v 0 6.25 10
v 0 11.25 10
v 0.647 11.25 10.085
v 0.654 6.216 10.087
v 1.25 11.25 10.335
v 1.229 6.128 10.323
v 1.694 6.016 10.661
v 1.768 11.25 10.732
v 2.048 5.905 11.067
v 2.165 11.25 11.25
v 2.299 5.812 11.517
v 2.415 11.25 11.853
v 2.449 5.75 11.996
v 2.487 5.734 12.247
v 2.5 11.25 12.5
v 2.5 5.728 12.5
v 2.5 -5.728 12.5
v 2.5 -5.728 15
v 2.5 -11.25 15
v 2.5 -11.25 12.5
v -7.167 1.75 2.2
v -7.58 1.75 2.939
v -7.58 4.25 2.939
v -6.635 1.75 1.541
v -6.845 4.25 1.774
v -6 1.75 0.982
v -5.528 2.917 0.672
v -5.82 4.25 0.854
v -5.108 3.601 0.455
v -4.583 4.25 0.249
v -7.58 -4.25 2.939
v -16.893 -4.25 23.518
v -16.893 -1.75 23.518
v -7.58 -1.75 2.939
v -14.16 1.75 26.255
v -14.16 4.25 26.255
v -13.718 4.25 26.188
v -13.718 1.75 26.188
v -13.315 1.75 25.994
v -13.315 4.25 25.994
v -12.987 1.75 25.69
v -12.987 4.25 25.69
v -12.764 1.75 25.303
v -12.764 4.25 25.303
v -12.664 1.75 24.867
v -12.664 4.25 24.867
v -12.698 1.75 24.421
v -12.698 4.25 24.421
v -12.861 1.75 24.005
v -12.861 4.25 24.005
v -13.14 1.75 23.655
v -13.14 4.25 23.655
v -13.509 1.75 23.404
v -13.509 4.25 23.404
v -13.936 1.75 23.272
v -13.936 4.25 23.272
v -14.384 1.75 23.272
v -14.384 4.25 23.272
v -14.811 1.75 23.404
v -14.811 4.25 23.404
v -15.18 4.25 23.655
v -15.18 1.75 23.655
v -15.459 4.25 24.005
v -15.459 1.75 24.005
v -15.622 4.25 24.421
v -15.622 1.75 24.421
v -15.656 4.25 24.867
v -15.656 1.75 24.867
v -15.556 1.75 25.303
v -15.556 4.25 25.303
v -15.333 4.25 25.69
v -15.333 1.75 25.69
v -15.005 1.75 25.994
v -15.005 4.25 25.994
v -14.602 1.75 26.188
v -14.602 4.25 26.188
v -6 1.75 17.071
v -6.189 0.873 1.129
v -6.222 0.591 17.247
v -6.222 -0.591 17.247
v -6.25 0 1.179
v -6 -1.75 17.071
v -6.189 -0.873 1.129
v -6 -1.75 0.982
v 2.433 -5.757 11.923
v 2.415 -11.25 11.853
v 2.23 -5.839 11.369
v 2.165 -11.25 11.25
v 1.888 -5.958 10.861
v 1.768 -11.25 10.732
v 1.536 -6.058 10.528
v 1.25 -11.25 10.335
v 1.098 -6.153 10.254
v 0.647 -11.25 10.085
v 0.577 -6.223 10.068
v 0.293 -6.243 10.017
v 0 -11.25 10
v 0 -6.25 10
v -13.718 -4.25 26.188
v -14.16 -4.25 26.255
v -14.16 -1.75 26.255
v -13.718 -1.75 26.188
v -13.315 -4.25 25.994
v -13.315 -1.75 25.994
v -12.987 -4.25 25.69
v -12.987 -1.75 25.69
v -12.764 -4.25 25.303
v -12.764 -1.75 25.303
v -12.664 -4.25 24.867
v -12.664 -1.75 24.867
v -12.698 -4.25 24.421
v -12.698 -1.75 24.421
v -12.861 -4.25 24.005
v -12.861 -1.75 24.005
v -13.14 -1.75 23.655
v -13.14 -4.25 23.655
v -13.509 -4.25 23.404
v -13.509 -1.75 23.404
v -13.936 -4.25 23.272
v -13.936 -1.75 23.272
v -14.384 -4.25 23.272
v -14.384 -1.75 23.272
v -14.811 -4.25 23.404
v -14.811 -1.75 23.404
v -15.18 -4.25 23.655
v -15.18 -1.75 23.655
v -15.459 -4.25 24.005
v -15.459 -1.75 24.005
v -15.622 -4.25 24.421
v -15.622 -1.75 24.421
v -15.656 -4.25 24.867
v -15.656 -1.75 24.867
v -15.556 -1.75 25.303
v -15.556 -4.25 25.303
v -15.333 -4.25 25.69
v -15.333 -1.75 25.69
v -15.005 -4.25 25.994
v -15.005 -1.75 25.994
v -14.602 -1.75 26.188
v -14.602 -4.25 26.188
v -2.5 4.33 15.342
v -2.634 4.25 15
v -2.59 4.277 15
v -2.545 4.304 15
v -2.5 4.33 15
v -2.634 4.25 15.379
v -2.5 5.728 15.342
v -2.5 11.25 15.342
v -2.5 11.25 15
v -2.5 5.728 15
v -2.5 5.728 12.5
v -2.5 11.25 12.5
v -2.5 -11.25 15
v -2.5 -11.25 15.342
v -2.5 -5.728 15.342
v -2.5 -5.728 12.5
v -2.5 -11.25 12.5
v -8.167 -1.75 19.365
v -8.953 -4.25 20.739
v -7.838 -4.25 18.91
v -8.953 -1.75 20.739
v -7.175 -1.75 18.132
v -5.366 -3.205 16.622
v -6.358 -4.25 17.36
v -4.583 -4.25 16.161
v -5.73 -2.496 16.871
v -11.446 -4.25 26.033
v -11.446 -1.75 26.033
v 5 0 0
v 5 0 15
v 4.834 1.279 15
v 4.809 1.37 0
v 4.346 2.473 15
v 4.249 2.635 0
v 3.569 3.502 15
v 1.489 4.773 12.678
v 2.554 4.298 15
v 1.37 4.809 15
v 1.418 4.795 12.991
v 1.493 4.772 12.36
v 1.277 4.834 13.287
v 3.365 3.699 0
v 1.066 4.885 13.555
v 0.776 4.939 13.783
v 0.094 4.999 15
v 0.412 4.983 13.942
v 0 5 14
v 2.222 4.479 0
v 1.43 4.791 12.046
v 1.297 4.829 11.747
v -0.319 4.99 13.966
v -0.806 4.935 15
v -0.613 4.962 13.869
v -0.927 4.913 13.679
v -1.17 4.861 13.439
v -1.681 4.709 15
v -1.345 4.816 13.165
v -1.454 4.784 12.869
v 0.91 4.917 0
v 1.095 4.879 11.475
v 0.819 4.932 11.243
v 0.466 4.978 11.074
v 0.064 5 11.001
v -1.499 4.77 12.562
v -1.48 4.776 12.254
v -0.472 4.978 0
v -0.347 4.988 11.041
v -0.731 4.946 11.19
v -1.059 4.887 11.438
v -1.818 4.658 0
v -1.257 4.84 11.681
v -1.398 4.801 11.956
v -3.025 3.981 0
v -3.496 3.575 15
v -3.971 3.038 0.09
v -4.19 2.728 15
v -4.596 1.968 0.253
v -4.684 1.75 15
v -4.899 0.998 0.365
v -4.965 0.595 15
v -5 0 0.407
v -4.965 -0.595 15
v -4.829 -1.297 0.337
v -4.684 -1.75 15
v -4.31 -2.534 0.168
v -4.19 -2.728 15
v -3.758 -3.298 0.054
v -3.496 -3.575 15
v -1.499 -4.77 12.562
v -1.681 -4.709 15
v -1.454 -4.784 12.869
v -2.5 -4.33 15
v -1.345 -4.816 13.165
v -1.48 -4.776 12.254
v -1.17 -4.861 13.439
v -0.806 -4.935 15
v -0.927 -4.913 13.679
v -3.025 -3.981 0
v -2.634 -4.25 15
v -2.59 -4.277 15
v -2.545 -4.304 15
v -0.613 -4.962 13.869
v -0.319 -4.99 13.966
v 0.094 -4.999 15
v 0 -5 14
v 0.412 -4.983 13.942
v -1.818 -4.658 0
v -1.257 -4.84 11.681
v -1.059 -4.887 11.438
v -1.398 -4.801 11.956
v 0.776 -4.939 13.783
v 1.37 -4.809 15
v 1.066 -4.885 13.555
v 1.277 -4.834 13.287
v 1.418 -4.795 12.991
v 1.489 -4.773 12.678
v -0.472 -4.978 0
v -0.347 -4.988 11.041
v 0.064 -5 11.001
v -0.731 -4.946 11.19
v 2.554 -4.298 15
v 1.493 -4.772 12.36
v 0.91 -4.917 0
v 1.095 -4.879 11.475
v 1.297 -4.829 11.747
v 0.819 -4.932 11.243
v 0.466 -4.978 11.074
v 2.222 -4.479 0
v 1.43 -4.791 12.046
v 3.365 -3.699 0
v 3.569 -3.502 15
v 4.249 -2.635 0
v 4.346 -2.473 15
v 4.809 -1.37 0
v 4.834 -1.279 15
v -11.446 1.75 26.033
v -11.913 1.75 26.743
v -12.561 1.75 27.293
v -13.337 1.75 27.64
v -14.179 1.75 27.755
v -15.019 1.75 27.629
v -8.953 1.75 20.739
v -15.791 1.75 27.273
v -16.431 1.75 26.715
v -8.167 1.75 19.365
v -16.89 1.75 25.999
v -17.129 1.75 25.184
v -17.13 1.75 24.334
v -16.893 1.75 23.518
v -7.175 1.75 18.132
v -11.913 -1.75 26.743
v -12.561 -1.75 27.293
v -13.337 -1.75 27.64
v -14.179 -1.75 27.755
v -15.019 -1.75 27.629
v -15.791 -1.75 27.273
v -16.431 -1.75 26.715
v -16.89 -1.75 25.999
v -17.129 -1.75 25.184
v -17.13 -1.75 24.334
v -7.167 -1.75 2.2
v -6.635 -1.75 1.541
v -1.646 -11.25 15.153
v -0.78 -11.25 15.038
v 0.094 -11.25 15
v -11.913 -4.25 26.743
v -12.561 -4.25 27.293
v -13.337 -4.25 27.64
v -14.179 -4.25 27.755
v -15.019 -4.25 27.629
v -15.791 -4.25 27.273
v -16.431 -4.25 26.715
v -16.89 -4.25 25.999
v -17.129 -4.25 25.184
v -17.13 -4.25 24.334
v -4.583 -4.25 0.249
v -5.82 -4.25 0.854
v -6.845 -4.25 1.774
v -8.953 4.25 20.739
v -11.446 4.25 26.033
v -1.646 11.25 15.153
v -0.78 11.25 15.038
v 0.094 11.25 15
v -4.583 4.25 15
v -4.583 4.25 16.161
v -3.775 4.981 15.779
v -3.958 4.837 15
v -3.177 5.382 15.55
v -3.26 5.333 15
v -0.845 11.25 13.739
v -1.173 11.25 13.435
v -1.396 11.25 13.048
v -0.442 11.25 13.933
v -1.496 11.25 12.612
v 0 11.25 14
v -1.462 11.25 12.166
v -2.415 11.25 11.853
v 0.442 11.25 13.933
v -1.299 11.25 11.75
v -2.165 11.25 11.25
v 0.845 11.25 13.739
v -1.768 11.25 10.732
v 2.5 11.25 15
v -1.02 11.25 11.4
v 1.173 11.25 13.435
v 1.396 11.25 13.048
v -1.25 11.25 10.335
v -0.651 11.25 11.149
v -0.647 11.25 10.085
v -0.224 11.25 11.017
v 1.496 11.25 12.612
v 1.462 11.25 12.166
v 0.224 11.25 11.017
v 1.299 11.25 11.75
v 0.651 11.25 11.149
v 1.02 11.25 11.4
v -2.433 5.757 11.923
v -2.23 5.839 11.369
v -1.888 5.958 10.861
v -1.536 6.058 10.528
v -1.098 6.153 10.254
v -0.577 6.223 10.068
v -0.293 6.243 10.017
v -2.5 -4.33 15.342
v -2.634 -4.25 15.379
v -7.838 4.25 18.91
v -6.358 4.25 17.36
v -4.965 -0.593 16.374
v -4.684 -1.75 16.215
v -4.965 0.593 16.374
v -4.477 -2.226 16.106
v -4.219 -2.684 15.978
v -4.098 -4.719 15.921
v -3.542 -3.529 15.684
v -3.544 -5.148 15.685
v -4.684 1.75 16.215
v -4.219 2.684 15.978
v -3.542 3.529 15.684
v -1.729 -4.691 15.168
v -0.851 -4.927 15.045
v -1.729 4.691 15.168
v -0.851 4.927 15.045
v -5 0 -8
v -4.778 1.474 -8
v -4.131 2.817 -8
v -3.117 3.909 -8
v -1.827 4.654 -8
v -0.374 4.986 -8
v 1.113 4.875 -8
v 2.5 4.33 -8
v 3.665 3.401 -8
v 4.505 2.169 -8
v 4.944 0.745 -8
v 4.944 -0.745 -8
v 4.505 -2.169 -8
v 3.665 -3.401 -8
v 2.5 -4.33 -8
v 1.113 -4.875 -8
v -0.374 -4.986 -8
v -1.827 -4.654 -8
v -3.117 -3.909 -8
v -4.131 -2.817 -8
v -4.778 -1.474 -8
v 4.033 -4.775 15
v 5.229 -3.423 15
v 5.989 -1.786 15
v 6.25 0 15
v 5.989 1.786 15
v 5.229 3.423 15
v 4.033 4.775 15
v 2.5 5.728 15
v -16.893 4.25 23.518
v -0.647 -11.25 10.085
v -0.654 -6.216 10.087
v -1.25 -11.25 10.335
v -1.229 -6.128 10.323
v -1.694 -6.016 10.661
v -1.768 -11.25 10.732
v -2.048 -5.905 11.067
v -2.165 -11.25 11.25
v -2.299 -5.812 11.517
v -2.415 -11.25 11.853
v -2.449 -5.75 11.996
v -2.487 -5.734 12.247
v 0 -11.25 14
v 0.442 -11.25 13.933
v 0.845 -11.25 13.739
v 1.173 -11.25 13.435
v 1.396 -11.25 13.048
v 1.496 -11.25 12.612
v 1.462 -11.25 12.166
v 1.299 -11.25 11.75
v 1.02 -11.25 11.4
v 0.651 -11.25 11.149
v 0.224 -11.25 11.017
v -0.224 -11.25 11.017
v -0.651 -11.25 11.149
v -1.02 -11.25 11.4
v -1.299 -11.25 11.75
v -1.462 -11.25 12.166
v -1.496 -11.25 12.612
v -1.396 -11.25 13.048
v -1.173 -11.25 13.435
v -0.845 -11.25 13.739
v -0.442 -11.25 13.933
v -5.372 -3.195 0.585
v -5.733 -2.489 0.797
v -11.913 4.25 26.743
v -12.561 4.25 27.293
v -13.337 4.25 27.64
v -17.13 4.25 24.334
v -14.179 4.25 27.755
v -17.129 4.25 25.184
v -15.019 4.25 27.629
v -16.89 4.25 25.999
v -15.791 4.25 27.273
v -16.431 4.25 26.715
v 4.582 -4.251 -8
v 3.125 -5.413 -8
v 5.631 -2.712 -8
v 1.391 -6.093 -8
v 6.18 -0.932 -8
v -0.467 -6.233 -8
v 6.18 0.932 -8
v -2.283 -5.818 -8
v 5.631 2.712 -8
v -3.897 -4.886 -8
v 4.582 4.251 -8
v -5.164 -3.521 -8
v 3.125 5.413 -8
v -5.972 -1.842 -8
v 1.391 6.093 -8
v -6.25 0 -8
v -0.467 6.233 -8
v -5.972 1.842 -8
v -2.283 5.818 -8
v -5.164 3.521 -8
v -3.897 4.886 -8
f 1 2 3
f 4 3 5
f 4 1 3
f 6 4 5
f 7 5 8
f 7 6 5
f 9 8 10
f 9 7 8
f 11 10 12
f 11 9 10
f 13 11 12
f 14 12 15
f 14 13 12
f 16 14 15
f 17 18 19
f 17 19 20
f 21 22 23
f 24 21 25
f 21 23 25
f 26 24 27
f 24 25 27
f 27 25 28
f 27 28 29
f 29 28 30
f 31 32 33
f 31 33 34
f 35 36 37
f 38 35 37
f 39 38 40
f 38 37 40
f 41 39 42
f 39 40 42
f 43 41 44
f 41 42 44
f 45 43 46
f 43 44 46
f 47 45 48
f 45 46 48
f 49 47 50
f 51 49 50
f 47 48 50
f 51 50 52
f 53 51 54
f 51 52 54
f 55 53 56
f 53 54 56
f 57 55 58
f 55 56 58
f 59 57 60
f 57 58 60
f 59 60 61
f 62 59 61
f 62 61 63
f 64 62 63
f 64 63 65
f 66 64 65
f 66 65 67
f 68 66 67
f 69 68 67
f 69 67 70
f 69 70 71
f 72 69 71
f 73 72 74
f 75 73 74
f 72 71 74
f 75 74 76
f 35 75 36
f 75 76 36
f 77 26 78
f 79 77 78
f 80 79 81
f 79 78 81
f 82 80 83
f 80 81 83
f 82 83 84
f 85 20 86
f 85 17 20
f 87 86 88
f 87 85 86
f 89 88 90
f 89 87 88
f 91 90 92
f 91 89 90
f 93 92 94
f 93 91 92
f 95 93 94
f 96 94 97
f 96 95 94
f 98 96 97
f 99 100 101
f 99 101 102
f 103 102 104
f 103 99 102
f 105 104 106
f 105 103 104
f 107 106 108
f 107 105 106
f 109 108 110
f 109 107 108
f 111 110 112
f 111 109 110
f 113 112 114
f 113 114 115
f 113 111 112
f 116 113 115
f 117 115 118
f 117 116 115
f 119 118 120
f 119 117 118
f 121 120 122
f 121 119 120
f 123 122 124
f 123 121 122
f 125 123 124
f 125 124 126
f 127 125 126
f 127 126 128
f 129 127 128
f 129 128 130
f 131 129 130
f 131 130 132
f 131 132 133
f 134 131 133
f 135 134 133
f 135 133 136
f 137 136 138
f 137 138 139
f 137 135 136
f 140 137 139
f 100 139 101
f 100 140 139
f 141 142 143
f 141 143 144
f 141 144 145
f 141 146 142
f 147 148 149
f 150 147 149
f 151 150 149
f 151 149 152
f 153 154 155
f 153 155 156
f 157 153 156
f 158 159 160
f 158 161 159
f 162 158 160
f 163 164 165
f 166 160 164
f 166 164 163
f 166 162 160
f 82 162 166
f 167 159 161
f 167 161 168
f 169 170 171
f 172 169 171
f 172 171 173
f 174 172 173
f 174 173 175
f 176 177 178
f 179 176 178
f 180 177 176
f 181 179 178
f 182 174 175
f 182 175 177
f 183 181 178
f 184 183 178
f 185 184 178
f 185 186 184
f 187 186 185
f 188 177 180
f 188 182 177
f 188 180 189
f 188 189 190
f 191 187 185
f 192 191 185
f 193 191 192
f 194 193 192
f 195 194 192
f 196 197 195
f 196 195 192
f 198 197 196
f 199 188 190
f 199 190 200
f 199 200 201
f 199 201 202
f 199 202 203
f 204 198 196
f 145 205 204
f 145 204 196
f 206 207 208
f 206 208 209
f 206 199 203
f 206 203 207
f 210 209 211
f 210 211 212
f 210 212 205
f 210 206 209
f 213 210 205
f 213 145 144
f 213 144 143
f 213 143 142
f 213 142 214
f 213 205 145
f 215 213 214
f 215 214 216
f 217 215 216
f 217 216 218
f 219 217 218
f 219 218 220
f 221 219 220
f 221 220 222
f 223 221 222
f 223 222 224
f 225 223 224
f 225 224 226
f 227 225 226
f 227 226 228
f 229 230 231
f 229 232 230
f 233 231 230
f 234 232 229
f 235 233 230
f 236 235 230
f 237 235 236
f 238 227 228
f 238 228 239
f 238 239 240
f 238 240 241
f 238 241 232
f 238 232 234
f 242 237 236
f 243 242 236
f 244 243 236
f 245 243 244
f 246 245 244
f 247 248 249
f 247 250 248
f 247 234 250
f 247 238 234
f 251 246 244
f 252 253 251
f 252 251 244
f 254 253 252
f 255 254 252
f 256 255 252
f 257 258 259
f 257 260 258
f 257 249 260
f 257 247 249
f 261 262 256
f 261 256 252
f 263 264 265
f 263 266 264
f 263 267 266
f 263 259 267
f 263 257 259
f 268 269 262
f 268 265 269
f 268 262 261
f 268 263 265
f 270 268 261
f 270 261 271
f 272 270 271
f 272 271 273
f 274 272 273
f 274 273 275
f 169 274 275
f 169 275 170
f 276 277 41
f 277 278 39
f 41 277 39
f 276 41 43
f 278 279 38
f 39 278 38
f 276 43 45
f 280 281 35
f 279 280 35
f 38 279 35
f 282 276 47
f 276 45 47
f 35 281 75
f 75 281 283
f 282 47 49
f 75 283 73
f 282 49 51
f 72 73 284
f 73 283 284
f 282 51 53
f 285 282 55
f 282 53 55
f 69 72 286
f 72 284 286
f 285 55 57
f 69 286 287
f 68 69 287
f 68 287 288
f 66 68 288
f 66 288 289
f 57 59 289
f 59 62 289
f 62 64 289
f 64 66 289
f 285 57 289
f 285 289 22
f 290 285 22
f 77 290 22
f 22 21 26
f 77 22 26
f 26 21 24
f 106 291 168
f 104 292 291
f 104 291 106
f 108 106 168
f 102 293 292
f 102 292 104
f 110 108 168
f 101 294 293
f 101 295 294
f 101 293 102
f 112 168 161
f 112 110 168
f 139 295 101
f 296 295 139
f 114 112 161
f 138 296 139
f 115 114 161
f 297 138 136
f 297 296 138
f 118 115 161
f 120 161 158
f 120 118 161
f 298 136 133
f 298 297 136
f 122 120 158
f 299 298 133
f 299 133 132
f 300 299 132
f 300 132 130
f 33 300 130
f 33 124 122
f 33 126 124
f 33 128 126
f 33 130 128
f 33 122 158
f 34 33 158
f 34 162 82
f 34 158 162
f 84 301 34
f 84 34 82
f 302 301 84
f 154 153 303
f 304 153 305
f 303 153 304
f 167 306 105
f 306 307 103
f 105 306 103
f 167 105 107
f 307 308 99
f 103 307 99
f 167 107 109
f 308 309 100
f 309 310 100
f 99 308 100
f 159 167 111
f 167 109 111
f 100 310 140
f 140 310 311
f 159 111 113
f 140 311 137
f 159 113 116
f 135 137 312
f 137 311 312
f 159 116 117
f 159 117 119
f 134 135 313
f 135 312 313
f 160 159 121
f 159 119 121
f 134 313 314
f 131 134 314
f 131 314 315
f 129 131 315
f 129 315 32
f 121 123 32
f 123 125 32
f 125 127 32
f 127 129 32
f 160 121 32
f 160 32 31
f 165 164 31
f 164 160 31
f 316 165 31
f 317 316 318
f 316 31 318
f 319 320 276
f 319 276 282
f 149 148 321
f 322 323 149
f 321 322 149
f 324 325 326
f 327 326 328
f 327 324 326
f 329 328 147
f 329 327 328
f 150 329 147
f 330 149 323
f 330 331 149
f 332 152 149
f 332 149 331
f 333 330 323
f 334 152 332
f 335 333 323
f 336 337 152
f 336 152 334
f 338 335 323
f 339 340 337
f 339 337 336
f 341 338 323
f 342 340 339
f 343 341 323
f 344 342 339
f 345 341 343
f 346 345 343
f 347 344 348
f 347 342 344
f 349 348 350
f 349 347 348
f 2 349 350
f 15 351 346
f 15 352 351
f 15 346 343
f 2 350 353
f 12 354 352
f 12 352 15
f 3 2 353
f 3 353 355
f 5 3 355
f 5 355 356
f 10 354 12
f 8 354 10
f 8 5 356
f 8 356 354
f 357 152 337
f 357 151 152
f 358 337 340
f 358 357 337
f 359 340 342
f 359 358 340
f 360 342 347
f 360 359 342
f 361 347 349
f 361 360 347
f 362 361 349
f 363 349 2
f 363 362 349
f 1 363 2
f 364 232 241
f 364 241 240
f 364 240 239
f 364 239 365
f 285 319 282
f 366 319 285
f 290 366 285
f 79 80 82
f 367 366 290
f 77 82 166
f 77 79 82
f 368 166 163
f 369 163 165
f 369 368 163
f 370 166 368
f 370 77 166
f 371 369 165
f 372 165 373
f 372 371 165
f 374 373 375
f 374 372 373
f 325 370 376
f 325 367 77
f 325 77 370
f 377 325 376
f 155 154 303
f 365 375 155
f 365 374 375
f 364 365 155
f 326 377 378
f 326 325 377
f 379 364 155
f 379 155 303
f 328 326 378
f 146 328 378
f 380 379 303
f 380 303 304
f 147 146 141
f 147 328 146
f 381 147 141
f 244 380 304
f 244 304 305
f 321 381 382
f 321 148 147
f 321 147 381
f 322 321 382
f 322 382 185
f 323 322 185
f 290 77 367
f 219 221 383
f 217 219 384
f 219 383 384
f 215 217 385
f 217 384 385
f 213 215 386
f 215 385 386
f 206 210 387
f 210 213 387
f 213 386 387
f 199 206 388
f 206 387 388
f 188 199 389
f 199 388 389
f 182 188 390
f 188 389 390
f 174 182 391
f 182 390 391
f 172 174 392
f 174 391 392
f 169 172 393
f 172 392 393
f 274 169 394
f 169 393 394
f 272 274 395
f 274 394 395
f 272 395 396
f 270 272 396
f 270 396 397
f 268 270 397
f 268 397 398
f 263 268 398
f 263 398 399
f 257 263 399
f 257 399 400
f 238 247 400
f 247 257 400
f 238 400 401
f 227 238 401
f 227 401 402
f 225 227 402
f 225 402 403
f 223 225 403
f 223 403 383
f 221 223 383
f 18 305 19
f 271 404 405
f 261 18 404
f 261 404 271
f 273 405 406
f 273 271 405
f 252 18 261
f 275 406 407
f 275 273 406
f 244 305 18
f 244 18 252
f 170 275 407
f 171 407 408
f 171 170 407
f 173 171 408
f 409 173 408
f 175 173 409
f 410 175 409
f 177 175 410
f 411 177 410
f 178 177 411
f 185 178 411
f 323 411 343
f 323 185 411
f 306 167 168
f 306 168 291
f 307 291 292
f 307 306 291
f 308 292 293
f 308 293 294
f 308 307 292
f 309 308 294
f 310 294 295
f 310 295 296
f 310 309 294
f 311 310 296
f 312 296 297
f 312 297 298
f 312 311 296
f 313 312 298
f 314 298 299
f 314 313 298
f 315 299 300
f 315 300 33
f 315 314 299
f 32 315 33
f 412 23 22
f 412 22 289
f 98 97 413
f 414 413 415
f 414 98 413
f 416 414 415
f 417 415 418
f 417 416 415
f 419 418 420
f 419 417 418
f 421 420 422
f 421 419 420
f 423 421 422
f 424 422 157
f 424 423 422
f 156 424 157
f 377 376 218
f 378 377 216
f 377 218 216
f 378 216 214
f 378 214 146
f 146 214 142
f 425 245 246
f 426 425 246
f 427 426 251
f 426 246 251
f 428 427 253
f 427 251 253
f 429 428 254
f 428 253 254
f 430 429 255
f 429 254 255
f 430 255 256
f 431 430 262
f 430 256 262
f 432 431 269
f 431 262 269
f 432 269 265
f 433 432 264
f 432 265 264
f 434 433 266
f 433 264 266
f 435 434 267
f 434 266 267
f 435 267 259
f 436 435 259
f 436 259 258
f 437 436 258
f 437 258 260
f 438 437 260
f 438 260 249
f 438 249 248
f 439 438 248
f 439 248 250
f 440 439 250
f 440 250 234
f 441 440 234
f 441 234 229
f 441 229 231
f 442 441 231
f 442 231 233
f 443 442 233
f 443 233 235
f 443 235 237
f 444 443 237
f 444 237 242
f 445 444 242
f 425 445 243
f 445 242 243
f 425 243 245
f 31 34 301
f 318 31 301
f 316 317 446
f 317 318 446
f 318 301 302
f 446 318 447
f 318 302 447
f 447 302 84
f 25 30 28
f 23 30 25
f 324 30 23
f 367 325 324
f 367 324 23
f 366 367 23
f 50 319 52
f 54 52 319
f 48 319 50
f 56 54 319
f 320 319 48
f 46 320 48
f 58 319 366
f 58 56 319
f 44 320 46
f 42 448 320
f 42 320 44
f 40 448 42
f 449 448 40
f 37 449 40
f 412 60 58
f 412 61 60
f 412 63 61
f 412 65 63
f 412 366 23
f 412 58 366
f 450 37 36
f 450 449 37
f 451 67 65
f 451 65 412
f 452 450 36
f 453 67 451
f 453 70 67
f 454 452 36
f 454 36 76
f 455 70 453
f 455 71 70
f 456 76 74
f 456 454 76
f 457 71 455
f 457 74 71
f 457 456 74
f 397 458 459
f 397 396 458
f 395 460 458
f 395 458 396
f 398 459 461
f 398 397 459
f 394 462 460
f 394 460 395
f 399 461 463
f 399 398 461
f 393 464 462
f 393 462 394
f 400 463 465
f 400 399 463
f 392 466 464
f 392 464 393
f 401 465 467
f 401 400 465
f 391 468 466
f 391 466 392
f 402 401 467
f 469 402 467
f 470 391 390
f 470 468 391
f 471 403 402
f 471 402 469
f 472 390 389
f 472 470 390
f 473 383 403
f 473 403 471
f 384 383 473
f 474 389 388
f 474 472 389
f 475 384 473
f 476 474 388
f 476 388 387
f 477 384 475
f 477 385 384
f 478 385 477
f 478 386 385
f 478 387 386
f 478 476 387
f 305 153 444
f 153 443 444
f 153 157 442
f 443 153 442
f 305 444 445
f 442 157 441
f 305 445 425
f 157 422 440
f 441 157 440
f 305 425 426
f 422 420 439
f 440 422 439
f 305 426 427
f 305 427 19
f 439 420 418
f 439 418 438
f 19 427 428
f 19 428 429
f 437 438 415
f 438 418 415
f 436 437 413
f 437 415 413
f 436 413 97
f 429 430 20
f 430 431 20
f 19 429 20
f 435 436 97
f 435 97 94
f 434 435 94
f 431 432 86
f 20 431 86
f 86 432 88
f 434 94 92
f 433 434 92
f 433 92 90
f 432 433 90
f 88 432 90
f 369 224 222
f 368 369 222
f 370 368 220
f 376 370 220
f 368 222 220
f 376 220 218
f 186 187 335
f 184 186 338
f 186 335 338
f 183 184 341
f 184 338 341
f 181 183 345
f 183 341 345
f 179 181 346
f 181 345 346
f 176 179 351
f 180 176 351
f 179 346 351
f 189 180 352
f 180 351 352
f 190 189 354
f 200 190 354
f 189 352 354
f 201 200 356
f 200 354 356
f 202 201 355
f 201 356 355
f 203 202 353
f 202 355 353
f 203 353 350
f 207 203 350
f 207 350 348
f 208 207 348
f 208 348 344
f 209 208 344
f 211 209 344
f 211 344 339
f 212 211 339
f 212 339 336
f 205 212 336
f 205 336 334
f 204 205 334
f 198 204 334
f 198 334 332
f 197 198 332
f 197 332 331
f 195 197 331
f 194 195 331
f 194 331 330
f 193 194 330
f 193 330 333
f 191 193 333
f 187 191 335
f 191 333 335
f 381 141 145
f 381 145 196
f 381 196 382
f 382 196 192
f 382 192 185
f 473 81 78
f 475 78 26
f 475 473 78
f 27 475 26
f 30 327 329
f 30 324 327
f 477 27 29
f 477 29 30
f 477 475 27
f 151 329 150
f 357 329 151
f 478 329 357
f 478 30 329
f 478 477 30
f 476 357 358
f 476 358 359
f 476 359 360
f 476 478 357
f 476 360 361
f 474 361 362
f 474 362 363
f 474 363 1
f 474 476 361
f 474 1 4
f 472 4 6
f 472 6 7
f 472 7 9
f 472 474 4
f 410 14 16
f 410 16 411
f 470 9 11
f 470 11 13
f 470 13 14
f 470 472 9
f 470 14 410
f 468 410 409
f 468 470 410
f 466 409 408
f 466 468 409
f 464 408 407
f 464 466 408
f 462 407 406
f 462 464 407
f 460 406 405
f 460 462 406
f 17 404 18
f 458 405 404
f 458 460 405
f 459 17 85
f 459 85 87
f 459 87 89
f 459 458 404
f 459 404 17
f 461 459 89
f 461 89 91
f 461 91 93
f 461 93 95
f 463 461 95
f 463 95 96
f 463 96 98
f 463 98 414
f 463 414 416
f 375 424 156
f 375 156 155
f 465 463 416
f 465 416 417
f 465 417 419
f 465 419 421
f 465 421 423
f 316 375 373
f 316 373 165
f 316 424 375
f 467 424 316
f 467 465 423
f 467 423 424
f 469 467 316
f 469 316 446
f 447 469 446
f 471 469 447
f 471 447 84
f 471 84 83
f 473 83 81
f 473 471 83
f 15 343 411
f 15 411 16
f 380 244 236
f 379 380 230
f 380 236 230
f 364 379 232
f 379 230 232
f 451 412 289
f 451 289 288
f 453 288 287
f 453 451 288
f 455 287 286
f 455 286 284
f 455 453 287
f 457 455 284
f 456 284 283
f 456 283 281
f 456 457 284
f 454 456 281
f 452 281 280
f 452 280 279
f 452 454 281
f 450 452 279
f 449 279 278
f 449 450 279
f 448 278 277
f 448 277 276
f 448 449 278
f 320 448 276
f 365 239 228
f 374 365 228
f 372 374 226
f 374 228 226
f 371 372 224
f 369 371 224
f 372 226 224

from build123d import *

# Parameters (mm, degrees)
CROQUIS1_R                   = 6.25
CROQUIS1_R_2                 = 5
SALIENTE_EXTRUIR1_DEPTH      = 15
SALIENTE_EXTRUIR2_REACH      = 25.881
SALIENTE_EXTRUIR2_END_RADIUS = 6.25
CROQUIS2_W                   = 5
CROQUIS2_H                   = 5
SALIENTE_EXTRUIR3_REACH      = 29.755
SALIENTE_EXTRUIR3_END_RADIUS = 6.25
CROQUIS3_W                   = 5
CROQUIS3_H                   = 5
CORTAR_EXTRUIR1_REACH        = 29.755
CROQUIS4_R                   = 1.5
REDONDEO1_R                  = 2.5
CROQUIS5_R                   = 1.5
SALIENTE_EXTRUIR4_DEPTH      = 2.5
SALIENTE_EXTRUIR5_REACH      = 34.452
CROQUIS6_W                   = 15
CROQUIS6_H                   = 2.5
CROQUIS7_R                   = 1.5
SALIENTE_EXTRUIR6_DEPTH      = 2.5
SALIENTE_EXTRUIR7_REACH      = 34.452
SALIENTE_EXTRUIR7_END_RADIUS = 6.25
CROQUIS8_W                   = 15
CROQUIS8_H                   = 2.5
REDONDEO2_R                  = 5
REDONDEO4_R                  = 10
SALIENTE_EXTRUIR9_REACH      = 43.224
CROQUIS10_R                  = 6.25
CROQUIS10_R_2                = 5


# Some blends are built 0.0001 mm under size
with BuildPart() as part:
    # Croquis1 → Saliente-Extruir1 (new body)
    with BuildSketch(Plane.XY):
        Circle(CROQUIS1_R)
        Circle(CROQUIS1_R_2, mode=Mode.SUBTRACT)
    extrude(amount=SALIENTE_EXTRUIR1_DEPTH)

    # Saliente-Extruir2: up to this cylinder (the profile starts outside it)
    saliente_extruir2_end = Plane(origin=(0, 0, 12.5), z_dir=(0, 0, -1)) * Cylinder(SALIENTE_EXTRUIR2_END_RADIUS, 65.262, mode=Mode.PRIVATE)
    # Croquis2 → Saliente-Extruir2 (add, up to the surface)
    with BuildSketch(Plane(origin=(0, 11.25, 0), x_dir=(1, 0, 0), z_dir=(0, 1, 0)), mode=Mode.PRIVATE) as saliente_extruir2_sk1:
        with Locations((0, -12.5)):
            Rectangle(CROQUIS2_W, CROQUIS2_H)
    saliente_extruir2_tool1 = extrude(saliente_extruir2_sk1.sketch, amount=-SALIENTE_EXTRUIR2_REACH, mode=Mode.PRIVATE) - saliente_extruir2_end
    add(saliente_extruir2_tool1.solids().sort_by_distance((0, 11.25, 12.5))[0])

    # Saliente-Extruir3: up to this cylinder (the profile starts outside it)
    saliente_extruir3_end = Plane(origin=(0, 0, 12.5), z_dir=(0, 0, -1)) * Cylinder(SALIENTE_EXTRUIR3_END_RADIUS, 73.01, mode=Mode.PRIVATE)
    # Croquis3 → Saliente-Extruir3 (add, up to the surface)
    with BuildSketch(Plane(origin=(0, -11.25, 0), x_dir=(1, 0, 0), z_dir=(0, 1, 0)), mode=Mode.PRIVATE) as saliente_extruir3_sk1:
        with Locations((0, -12.5)):
            Rectangle(CROQUIS3_W, CROQUIS3_H)
    saliente_extruir3_tool1 = extrude(saliente_extruir3_sk1.sketch, amount=SALIENTE_EXTRUIR3_REACH, mode=Mode.PRIVATE) - saliente_extruir3_end
    add(saliente_extruir3_tool1.solids().sort_by_distance((0, -11.25, 12.5))[0])

    # Cortar-Extruir1: up to this face of the body (flat: up to its plane)
    cortar_extruir1_end = Plane(part.part.faces().sort_by_distance((0, -11.25, 12.5))[0])
    # Croquis4 → Cortar-Extruir1 (cut, up to the picked face)
    with BuildSketch(Plane(origin=(0, 11.25, 0), x_dir=(1, 0, 0), z_dir=(0, 1, 0)), mode=Mode.PRIVATE) as cortar_extruir1_sk1:
        with Locations(Location((0, -12.5, 0), (0, 0, 270))):
            Circle(CROQUIS4_R)
    cortar_extruir1_tool1 = split(extrude(cortar_extruir1_sk1.sketch, amount=-CORTAR_EXTRUIR1_REACH, mode=Mode.PRIVATE), bisect_by=cortar_extruir1_end, keep=Keep.BOTH, mode=Mode.PRIVATE)
    add(cortar_extruir1_tool1.solids().sort_by(Axis((0, 11.25, 12.5), (0, -1, 0)))[0], mode=Mode.SUBTRACT)

    # Redondeo1
    redondeo1_edges = [part.edges().sort_by_distance(p)[0] for p in [
        (-2.5, -8.489109809, 10),
        (2.5, -8.489109809, 10),
        (-2.5, 8.489109809, 10),
        (2.5, 8.489109809, 10),
    ]]
    fillet(redondeo1_edges, radius=REDONDEO1_R - 0.0001)  # a hair under: the kernel refuses the full size

    # Croquis6 → Saliente-Extruir5 (add, up to next)
    with BuildSketch(Plane(origin=(-6.25, 0, 0), x_dir=(0, 0, -1), z_dir=(1, 0, 0)), mode=Mode.PRIVATE) as saliente_extruir5_sk1:
        with Locations((-7.5, -3)):
            Rectangle(CROQUIS6_W, CROQUIS6_H)
    saliente_extruir5_tool1 = extrude(saliente_extruir5_sk1.sketch, amount=SALIENTE_EXTRUIR5_REACH, mode=Mode.PRIVATE) - part.part


with BuildPart() as body_2:
    # Croquis5 → Saliente-Extruir4 (new body)
    with BuildSketch(Plane(origin=(0, -4.25, 0), x_dir=(1, 0, 0), z_dir=(0, 1, 0))):
        with BuildLine():
            Line((-6.25, -15), (-11.445879417, -26.033157432))
            ThreePointArc((-11.445879417, -26.033157432), (-15.41753329, -27.478700895), (-16.893124871, -23.518112569))
            Line((-16.893124871, -23.518112569), (-6.25, 0))
            Line((-6.25, 0), (-6.25, -15))
        make_face()
        with Locations(Location((-14.159974768, -24.755, 0), (0, 0, 270))):
            Circle(CROQUIS5_R, mode=Mode.SUBTRACT)
    extrude(amount=SALIENTE_EXTRUIR4_DEPTH)


with BuildPart() as part_1:
    add(part.part)

    add(body_2.part)  # Saliente-Extruir5 merges body 2
    add(saliente_extruir5_tool1.solids().sort_by_distance((-6.25, -3, 7.5))[0])



with BuildPart() as body_2_2:
    # Croquis7 → Saliente-Extruir6 (new body)
    with BuildSketch(Plane(origin=(0, 4.25, 0), x_dir=(1, 0, 0), z_dir=(0, 1, 0))):
        with BuildLine():
            Line((-11.445879417, -26.033157432), (-6.25, -15))
            Line((-6.25, -15), (-6.25, 0))
            Line((-6.25, 0), (-16.893124871, -23.518112569))
            ThreePointArc((-16.893124871, -23.518112569), (-15.41753329, -27.478700895), (-11.445879417, -26.033157432))
        make_face()
        with Locations(Location((-14.159974768, -24.755, 0), (0, 0, 270))):
            Circle(CROQUIS7_R, mode=Mode.SUBTRACT)
    extrude(amount=-SALIENTE_EXTRUIR6_DEPTH)


with BuildPart() as part_2:
    add(part_1.part)

    add(body_2_2.part)  # Saliente-Extruir7 merges body 2 2
    # Saliente-Extruir7: up to this cylinder (the profile starts outside it)
    saliente_extruir7_end = Plane(origin=(0, 0, 7.5), z_dir=(0, 0, -1)) * Cylinder(SALIENTE_EXTRUIR7_END_RADIUS, 82.404, mode=Mode.PRIVATE)
    # Croquis8 → Saliente-Extruir7 (add, up to the surface)
    with BuildSketch(Plane(origin=(-6.25, 0, 0), x_dir=(0, 0, -1), z_dir=(1, 0, 0)), mode=Mode.PRIVATE) as saliente_extruir7_sk1:
        with Locations((-7.5, 3)):
            Rectangle(CROQUIS8_W, CROQUIS8_H)
    saliente_extruir7_tool1 = extrude(saliente_extruir7_sk1.sketch, amount=SALIENTE_EXTRUIR7_REACH, mode=Mode.PRIVATE) - saliente_extruir7_end
    add(saliente_extruir7_tool1.solids().sort_by_distance((-6.25, 3, 7.5))[0])

    # Redondeo2
    # the kernel refuses this fillet: 5 mm, written as the material it takes off along each edge
    with BuildSketch(Plane(origin=(-6.25, 12.313555344, 0), x_dir=(1, 0, 0), z_dir=(0, -1, 0))) as redondeo2_piece_1:
        with BuildLine():
            CenterArc((REDONDEO2_R * 0.645084427485, REDONDEO2_R), REDONDEO2_R, 204.349135832, 65.650864168)
            Line((-REDONDEO2_R * 0.265965606724, REDONDEO2_R * 0.587704189728), (0, 0))
            Line((0, 0), (REDONDEO2_R * 0.645084427485, 0))
        make_face()
    extrude(amount=18.627110687, mode=Mode.SUBTRACT)

    # Redondeo4
    # the kernel refuses this fillet: 10 mm, written as the material it adds along each edge
    with BuildSketch(Plane(origin=(-6.25, 20.110188614, 15), x_dir=(1, 0, 0), z_dir=(0, -1, 0))) as redondeo4_piece_1_section:
        with BuildLine():
            CenterArc((REDONDEO4_R * 0.634407544548, REDONDEO4_R), REDONDEO4_R, 205.2173, 64.7827)
            Line((-REDONDEO4_R * 0.27029090604, REDONDEO4_R * 0.573947522594), (0, 0))
            Line((0, 0), (REDONDEO4_R * 0.634407544548, 0))
        make_face()
    redondeo4_piece_1 = extrude(amount=34.220377227, mode=Mode.PRIVATE)
    redondeo4_piece_1 = split(redondeo4_piece_1, bisect_by=Plane(origin=(-2.5, 8.596165387, 15.10356988), z_dir=(1, 0, 0)), keep=Keep.TOP, mode=Mode.PRIVATE)
    redondeo4_piece_1 = split(redondeo4_piece_1, bisect_by=Plane(origin=(-1.866709216, -11.25, 15.10356988), z_dir=(0, 1, 0)), keep=Keep.TOP, mode=Mode.PRIVATE)
    redondeo4_piece_1 = split(redondeo4_piece_1, bisect_by=Plane(origin=(-1.866709216, 11.25, 15.10356988), z_dir=(0, -1, 0)), keep=Keep.TOP, mode=Mode.PRIVATE)
    redondeo4_piece_1 = redondeo4_piece_1 - Plane(origin=(0, 0, 15.10356988), x_dir=(1, 0, 0), z_dir=(0, 0, -1)) * Cylinder(5, 94, mode=Mode.PRIVATE)
    add(redondeo4_piece_1)
    with BuildSketch(Plane(origin=(-6.25, 4.25, 15), x_dir=(1, 0, 0), z_dir=(0, -1, 0))) as redondeo4_piece_2_section:
        with BuildLine():
            CenterArc((REDONDEO4_R * 0.634407544548, REDONDEO4_R), REDONDEO4_R, 205.2173, 64.7827)
            Line((-REDONDEO4_R * 0.27029090604, REDONDEO4_R * 0.573947522594), (0, 0))
            Line((0, 0), (REDONDEO4_R * 0.634407544548, 0))
        make_face()
    redondeo4_piece_2 = extrude(amount=2.5, mode=Mode.PRIVATE)
    redondeo4_piece_2 = redondeo4_piece_2 - Plane(origin=(0, 0, 16.752062652), x_dir=(1, 0, 0), z_dir=(0, 0, -1)) * Cylinder(5, 31, mode=Mode.PRIVATE)
    add(redondeo4_piece_2)
    with BuildSketch(Plane(origin=(-6.25, 20.110188614, 15), x_dir=(1, 0, 0), z_dir=(0, -1, 0))) as redondeo4_piece_3_section:
        with BuildLine():
            CenterArc((REDONDEO4_R * 0.634407544548, REDONDEO4_R), REDONDEO4_R, 205.2173, 64.7827)
            Line((-REDONDEO4_R * 0.27029090604, REDONDEO4_R * 0.573947522594), (0, 0))
            Line((0, 0), (REDONDEO4_R * 0.634407544548, 0))
        make_face()
    redondeo4_piece_3 = extrude(amount=34.220377227, mode=Mode.PRIVATE)
    redondeo4_piece_3 = redondeo4_piece_3 & Plane(origin=(0, 0, 15.324058302), x_dir=(1, 0, 0), z_dir=(0, 0, -1)) * Cylinder(6.25, 94, mode=Mode.PRIVATE)
    redondeo4_piece_3 = redondeo4_piece_3 - Plane(origin=(0, 0, 15.324058302), x_dir=(1, 0, 0), z_dir=(0, 0, -1)) * Cylinder(5, 94, mode=Mode.PRIVATE)
    add(redondeo4_piece_3)
    with BuildSketch(Plane(origin=(-6.25, 20.110188614, 15), x_dir=(1, 0, 0), z_dir=(0, -1, 0))) as redondeo4_piece_4_section:
        with BuildLine():
            CenterArc((REDONDEO4_R * 0.634407544548, REDONDEO4_R), REDONDEO4_R, 205.2173, 64.7827)
            Line((-REDONDEO4_R * 0.27029090604, REDONDEO4_R * 0.573947522594), (0, 0))
            Line((0, 0), (REDONDEO4_R * 0.634407544548, 0))
        make_face()
    redondeo4_piece_4 = extrude(amount=34.220377227, mode=Mode.PRIVATE)
    redondeo4_piece_4 = split(redondeo4_piece_4, bisect_by=Plane(origin=(-6.508076771, -4.25, 16.752062651), z_dir=(0, 1, 0)), keep=Keep.TOP, mode=Mode.PRIVATE)
    redondeo4_piece_4 = split(redondeo4_piece_4, bisect_by=Plane(origin=(-6.508076771, -1.75, 16.752062651), z_dir=(0, -1, 0)), keep=Keep.TOP, mode=Mode.PRIVATE)
    redondeo4_piece_4 = redondeo4_piece_4 - Plane(origin=(0, 0, 16.752062651), x_dir=(1, 0, 0), z_dir=(0, 0, -1)) * Cylinder(5, 94, mode=Mode.PRIVATE)
    add(redondeo4_piece_4)

    # Croquis10 → Saliente-Extruir9 (add, up to next)
    with BuildSketch(Plane(origin=(0, 0, -8), x_dir=(-1, 0, 0), z_dir=(0, 0, -1)), mode=Mode.PRIVATE) as saliente_extruir9_sk1:
        Circle(CROQUIS10_R)
        Circle(CROQUIS10_R_2, mode=Mode.SUBTRACT)
    saliente_extruir9_tool1 = extrude(saliente_extruir9_sk1.sketch, amount=-SALIENTE_EXTRUIR9_REACH, mode=Mode.PRIVATE) - part_2.part
    add(saliente_extruir9_tool1.solids().sort_by_distance((6.073223, 0, -8))[0])


solid = part_2.part
